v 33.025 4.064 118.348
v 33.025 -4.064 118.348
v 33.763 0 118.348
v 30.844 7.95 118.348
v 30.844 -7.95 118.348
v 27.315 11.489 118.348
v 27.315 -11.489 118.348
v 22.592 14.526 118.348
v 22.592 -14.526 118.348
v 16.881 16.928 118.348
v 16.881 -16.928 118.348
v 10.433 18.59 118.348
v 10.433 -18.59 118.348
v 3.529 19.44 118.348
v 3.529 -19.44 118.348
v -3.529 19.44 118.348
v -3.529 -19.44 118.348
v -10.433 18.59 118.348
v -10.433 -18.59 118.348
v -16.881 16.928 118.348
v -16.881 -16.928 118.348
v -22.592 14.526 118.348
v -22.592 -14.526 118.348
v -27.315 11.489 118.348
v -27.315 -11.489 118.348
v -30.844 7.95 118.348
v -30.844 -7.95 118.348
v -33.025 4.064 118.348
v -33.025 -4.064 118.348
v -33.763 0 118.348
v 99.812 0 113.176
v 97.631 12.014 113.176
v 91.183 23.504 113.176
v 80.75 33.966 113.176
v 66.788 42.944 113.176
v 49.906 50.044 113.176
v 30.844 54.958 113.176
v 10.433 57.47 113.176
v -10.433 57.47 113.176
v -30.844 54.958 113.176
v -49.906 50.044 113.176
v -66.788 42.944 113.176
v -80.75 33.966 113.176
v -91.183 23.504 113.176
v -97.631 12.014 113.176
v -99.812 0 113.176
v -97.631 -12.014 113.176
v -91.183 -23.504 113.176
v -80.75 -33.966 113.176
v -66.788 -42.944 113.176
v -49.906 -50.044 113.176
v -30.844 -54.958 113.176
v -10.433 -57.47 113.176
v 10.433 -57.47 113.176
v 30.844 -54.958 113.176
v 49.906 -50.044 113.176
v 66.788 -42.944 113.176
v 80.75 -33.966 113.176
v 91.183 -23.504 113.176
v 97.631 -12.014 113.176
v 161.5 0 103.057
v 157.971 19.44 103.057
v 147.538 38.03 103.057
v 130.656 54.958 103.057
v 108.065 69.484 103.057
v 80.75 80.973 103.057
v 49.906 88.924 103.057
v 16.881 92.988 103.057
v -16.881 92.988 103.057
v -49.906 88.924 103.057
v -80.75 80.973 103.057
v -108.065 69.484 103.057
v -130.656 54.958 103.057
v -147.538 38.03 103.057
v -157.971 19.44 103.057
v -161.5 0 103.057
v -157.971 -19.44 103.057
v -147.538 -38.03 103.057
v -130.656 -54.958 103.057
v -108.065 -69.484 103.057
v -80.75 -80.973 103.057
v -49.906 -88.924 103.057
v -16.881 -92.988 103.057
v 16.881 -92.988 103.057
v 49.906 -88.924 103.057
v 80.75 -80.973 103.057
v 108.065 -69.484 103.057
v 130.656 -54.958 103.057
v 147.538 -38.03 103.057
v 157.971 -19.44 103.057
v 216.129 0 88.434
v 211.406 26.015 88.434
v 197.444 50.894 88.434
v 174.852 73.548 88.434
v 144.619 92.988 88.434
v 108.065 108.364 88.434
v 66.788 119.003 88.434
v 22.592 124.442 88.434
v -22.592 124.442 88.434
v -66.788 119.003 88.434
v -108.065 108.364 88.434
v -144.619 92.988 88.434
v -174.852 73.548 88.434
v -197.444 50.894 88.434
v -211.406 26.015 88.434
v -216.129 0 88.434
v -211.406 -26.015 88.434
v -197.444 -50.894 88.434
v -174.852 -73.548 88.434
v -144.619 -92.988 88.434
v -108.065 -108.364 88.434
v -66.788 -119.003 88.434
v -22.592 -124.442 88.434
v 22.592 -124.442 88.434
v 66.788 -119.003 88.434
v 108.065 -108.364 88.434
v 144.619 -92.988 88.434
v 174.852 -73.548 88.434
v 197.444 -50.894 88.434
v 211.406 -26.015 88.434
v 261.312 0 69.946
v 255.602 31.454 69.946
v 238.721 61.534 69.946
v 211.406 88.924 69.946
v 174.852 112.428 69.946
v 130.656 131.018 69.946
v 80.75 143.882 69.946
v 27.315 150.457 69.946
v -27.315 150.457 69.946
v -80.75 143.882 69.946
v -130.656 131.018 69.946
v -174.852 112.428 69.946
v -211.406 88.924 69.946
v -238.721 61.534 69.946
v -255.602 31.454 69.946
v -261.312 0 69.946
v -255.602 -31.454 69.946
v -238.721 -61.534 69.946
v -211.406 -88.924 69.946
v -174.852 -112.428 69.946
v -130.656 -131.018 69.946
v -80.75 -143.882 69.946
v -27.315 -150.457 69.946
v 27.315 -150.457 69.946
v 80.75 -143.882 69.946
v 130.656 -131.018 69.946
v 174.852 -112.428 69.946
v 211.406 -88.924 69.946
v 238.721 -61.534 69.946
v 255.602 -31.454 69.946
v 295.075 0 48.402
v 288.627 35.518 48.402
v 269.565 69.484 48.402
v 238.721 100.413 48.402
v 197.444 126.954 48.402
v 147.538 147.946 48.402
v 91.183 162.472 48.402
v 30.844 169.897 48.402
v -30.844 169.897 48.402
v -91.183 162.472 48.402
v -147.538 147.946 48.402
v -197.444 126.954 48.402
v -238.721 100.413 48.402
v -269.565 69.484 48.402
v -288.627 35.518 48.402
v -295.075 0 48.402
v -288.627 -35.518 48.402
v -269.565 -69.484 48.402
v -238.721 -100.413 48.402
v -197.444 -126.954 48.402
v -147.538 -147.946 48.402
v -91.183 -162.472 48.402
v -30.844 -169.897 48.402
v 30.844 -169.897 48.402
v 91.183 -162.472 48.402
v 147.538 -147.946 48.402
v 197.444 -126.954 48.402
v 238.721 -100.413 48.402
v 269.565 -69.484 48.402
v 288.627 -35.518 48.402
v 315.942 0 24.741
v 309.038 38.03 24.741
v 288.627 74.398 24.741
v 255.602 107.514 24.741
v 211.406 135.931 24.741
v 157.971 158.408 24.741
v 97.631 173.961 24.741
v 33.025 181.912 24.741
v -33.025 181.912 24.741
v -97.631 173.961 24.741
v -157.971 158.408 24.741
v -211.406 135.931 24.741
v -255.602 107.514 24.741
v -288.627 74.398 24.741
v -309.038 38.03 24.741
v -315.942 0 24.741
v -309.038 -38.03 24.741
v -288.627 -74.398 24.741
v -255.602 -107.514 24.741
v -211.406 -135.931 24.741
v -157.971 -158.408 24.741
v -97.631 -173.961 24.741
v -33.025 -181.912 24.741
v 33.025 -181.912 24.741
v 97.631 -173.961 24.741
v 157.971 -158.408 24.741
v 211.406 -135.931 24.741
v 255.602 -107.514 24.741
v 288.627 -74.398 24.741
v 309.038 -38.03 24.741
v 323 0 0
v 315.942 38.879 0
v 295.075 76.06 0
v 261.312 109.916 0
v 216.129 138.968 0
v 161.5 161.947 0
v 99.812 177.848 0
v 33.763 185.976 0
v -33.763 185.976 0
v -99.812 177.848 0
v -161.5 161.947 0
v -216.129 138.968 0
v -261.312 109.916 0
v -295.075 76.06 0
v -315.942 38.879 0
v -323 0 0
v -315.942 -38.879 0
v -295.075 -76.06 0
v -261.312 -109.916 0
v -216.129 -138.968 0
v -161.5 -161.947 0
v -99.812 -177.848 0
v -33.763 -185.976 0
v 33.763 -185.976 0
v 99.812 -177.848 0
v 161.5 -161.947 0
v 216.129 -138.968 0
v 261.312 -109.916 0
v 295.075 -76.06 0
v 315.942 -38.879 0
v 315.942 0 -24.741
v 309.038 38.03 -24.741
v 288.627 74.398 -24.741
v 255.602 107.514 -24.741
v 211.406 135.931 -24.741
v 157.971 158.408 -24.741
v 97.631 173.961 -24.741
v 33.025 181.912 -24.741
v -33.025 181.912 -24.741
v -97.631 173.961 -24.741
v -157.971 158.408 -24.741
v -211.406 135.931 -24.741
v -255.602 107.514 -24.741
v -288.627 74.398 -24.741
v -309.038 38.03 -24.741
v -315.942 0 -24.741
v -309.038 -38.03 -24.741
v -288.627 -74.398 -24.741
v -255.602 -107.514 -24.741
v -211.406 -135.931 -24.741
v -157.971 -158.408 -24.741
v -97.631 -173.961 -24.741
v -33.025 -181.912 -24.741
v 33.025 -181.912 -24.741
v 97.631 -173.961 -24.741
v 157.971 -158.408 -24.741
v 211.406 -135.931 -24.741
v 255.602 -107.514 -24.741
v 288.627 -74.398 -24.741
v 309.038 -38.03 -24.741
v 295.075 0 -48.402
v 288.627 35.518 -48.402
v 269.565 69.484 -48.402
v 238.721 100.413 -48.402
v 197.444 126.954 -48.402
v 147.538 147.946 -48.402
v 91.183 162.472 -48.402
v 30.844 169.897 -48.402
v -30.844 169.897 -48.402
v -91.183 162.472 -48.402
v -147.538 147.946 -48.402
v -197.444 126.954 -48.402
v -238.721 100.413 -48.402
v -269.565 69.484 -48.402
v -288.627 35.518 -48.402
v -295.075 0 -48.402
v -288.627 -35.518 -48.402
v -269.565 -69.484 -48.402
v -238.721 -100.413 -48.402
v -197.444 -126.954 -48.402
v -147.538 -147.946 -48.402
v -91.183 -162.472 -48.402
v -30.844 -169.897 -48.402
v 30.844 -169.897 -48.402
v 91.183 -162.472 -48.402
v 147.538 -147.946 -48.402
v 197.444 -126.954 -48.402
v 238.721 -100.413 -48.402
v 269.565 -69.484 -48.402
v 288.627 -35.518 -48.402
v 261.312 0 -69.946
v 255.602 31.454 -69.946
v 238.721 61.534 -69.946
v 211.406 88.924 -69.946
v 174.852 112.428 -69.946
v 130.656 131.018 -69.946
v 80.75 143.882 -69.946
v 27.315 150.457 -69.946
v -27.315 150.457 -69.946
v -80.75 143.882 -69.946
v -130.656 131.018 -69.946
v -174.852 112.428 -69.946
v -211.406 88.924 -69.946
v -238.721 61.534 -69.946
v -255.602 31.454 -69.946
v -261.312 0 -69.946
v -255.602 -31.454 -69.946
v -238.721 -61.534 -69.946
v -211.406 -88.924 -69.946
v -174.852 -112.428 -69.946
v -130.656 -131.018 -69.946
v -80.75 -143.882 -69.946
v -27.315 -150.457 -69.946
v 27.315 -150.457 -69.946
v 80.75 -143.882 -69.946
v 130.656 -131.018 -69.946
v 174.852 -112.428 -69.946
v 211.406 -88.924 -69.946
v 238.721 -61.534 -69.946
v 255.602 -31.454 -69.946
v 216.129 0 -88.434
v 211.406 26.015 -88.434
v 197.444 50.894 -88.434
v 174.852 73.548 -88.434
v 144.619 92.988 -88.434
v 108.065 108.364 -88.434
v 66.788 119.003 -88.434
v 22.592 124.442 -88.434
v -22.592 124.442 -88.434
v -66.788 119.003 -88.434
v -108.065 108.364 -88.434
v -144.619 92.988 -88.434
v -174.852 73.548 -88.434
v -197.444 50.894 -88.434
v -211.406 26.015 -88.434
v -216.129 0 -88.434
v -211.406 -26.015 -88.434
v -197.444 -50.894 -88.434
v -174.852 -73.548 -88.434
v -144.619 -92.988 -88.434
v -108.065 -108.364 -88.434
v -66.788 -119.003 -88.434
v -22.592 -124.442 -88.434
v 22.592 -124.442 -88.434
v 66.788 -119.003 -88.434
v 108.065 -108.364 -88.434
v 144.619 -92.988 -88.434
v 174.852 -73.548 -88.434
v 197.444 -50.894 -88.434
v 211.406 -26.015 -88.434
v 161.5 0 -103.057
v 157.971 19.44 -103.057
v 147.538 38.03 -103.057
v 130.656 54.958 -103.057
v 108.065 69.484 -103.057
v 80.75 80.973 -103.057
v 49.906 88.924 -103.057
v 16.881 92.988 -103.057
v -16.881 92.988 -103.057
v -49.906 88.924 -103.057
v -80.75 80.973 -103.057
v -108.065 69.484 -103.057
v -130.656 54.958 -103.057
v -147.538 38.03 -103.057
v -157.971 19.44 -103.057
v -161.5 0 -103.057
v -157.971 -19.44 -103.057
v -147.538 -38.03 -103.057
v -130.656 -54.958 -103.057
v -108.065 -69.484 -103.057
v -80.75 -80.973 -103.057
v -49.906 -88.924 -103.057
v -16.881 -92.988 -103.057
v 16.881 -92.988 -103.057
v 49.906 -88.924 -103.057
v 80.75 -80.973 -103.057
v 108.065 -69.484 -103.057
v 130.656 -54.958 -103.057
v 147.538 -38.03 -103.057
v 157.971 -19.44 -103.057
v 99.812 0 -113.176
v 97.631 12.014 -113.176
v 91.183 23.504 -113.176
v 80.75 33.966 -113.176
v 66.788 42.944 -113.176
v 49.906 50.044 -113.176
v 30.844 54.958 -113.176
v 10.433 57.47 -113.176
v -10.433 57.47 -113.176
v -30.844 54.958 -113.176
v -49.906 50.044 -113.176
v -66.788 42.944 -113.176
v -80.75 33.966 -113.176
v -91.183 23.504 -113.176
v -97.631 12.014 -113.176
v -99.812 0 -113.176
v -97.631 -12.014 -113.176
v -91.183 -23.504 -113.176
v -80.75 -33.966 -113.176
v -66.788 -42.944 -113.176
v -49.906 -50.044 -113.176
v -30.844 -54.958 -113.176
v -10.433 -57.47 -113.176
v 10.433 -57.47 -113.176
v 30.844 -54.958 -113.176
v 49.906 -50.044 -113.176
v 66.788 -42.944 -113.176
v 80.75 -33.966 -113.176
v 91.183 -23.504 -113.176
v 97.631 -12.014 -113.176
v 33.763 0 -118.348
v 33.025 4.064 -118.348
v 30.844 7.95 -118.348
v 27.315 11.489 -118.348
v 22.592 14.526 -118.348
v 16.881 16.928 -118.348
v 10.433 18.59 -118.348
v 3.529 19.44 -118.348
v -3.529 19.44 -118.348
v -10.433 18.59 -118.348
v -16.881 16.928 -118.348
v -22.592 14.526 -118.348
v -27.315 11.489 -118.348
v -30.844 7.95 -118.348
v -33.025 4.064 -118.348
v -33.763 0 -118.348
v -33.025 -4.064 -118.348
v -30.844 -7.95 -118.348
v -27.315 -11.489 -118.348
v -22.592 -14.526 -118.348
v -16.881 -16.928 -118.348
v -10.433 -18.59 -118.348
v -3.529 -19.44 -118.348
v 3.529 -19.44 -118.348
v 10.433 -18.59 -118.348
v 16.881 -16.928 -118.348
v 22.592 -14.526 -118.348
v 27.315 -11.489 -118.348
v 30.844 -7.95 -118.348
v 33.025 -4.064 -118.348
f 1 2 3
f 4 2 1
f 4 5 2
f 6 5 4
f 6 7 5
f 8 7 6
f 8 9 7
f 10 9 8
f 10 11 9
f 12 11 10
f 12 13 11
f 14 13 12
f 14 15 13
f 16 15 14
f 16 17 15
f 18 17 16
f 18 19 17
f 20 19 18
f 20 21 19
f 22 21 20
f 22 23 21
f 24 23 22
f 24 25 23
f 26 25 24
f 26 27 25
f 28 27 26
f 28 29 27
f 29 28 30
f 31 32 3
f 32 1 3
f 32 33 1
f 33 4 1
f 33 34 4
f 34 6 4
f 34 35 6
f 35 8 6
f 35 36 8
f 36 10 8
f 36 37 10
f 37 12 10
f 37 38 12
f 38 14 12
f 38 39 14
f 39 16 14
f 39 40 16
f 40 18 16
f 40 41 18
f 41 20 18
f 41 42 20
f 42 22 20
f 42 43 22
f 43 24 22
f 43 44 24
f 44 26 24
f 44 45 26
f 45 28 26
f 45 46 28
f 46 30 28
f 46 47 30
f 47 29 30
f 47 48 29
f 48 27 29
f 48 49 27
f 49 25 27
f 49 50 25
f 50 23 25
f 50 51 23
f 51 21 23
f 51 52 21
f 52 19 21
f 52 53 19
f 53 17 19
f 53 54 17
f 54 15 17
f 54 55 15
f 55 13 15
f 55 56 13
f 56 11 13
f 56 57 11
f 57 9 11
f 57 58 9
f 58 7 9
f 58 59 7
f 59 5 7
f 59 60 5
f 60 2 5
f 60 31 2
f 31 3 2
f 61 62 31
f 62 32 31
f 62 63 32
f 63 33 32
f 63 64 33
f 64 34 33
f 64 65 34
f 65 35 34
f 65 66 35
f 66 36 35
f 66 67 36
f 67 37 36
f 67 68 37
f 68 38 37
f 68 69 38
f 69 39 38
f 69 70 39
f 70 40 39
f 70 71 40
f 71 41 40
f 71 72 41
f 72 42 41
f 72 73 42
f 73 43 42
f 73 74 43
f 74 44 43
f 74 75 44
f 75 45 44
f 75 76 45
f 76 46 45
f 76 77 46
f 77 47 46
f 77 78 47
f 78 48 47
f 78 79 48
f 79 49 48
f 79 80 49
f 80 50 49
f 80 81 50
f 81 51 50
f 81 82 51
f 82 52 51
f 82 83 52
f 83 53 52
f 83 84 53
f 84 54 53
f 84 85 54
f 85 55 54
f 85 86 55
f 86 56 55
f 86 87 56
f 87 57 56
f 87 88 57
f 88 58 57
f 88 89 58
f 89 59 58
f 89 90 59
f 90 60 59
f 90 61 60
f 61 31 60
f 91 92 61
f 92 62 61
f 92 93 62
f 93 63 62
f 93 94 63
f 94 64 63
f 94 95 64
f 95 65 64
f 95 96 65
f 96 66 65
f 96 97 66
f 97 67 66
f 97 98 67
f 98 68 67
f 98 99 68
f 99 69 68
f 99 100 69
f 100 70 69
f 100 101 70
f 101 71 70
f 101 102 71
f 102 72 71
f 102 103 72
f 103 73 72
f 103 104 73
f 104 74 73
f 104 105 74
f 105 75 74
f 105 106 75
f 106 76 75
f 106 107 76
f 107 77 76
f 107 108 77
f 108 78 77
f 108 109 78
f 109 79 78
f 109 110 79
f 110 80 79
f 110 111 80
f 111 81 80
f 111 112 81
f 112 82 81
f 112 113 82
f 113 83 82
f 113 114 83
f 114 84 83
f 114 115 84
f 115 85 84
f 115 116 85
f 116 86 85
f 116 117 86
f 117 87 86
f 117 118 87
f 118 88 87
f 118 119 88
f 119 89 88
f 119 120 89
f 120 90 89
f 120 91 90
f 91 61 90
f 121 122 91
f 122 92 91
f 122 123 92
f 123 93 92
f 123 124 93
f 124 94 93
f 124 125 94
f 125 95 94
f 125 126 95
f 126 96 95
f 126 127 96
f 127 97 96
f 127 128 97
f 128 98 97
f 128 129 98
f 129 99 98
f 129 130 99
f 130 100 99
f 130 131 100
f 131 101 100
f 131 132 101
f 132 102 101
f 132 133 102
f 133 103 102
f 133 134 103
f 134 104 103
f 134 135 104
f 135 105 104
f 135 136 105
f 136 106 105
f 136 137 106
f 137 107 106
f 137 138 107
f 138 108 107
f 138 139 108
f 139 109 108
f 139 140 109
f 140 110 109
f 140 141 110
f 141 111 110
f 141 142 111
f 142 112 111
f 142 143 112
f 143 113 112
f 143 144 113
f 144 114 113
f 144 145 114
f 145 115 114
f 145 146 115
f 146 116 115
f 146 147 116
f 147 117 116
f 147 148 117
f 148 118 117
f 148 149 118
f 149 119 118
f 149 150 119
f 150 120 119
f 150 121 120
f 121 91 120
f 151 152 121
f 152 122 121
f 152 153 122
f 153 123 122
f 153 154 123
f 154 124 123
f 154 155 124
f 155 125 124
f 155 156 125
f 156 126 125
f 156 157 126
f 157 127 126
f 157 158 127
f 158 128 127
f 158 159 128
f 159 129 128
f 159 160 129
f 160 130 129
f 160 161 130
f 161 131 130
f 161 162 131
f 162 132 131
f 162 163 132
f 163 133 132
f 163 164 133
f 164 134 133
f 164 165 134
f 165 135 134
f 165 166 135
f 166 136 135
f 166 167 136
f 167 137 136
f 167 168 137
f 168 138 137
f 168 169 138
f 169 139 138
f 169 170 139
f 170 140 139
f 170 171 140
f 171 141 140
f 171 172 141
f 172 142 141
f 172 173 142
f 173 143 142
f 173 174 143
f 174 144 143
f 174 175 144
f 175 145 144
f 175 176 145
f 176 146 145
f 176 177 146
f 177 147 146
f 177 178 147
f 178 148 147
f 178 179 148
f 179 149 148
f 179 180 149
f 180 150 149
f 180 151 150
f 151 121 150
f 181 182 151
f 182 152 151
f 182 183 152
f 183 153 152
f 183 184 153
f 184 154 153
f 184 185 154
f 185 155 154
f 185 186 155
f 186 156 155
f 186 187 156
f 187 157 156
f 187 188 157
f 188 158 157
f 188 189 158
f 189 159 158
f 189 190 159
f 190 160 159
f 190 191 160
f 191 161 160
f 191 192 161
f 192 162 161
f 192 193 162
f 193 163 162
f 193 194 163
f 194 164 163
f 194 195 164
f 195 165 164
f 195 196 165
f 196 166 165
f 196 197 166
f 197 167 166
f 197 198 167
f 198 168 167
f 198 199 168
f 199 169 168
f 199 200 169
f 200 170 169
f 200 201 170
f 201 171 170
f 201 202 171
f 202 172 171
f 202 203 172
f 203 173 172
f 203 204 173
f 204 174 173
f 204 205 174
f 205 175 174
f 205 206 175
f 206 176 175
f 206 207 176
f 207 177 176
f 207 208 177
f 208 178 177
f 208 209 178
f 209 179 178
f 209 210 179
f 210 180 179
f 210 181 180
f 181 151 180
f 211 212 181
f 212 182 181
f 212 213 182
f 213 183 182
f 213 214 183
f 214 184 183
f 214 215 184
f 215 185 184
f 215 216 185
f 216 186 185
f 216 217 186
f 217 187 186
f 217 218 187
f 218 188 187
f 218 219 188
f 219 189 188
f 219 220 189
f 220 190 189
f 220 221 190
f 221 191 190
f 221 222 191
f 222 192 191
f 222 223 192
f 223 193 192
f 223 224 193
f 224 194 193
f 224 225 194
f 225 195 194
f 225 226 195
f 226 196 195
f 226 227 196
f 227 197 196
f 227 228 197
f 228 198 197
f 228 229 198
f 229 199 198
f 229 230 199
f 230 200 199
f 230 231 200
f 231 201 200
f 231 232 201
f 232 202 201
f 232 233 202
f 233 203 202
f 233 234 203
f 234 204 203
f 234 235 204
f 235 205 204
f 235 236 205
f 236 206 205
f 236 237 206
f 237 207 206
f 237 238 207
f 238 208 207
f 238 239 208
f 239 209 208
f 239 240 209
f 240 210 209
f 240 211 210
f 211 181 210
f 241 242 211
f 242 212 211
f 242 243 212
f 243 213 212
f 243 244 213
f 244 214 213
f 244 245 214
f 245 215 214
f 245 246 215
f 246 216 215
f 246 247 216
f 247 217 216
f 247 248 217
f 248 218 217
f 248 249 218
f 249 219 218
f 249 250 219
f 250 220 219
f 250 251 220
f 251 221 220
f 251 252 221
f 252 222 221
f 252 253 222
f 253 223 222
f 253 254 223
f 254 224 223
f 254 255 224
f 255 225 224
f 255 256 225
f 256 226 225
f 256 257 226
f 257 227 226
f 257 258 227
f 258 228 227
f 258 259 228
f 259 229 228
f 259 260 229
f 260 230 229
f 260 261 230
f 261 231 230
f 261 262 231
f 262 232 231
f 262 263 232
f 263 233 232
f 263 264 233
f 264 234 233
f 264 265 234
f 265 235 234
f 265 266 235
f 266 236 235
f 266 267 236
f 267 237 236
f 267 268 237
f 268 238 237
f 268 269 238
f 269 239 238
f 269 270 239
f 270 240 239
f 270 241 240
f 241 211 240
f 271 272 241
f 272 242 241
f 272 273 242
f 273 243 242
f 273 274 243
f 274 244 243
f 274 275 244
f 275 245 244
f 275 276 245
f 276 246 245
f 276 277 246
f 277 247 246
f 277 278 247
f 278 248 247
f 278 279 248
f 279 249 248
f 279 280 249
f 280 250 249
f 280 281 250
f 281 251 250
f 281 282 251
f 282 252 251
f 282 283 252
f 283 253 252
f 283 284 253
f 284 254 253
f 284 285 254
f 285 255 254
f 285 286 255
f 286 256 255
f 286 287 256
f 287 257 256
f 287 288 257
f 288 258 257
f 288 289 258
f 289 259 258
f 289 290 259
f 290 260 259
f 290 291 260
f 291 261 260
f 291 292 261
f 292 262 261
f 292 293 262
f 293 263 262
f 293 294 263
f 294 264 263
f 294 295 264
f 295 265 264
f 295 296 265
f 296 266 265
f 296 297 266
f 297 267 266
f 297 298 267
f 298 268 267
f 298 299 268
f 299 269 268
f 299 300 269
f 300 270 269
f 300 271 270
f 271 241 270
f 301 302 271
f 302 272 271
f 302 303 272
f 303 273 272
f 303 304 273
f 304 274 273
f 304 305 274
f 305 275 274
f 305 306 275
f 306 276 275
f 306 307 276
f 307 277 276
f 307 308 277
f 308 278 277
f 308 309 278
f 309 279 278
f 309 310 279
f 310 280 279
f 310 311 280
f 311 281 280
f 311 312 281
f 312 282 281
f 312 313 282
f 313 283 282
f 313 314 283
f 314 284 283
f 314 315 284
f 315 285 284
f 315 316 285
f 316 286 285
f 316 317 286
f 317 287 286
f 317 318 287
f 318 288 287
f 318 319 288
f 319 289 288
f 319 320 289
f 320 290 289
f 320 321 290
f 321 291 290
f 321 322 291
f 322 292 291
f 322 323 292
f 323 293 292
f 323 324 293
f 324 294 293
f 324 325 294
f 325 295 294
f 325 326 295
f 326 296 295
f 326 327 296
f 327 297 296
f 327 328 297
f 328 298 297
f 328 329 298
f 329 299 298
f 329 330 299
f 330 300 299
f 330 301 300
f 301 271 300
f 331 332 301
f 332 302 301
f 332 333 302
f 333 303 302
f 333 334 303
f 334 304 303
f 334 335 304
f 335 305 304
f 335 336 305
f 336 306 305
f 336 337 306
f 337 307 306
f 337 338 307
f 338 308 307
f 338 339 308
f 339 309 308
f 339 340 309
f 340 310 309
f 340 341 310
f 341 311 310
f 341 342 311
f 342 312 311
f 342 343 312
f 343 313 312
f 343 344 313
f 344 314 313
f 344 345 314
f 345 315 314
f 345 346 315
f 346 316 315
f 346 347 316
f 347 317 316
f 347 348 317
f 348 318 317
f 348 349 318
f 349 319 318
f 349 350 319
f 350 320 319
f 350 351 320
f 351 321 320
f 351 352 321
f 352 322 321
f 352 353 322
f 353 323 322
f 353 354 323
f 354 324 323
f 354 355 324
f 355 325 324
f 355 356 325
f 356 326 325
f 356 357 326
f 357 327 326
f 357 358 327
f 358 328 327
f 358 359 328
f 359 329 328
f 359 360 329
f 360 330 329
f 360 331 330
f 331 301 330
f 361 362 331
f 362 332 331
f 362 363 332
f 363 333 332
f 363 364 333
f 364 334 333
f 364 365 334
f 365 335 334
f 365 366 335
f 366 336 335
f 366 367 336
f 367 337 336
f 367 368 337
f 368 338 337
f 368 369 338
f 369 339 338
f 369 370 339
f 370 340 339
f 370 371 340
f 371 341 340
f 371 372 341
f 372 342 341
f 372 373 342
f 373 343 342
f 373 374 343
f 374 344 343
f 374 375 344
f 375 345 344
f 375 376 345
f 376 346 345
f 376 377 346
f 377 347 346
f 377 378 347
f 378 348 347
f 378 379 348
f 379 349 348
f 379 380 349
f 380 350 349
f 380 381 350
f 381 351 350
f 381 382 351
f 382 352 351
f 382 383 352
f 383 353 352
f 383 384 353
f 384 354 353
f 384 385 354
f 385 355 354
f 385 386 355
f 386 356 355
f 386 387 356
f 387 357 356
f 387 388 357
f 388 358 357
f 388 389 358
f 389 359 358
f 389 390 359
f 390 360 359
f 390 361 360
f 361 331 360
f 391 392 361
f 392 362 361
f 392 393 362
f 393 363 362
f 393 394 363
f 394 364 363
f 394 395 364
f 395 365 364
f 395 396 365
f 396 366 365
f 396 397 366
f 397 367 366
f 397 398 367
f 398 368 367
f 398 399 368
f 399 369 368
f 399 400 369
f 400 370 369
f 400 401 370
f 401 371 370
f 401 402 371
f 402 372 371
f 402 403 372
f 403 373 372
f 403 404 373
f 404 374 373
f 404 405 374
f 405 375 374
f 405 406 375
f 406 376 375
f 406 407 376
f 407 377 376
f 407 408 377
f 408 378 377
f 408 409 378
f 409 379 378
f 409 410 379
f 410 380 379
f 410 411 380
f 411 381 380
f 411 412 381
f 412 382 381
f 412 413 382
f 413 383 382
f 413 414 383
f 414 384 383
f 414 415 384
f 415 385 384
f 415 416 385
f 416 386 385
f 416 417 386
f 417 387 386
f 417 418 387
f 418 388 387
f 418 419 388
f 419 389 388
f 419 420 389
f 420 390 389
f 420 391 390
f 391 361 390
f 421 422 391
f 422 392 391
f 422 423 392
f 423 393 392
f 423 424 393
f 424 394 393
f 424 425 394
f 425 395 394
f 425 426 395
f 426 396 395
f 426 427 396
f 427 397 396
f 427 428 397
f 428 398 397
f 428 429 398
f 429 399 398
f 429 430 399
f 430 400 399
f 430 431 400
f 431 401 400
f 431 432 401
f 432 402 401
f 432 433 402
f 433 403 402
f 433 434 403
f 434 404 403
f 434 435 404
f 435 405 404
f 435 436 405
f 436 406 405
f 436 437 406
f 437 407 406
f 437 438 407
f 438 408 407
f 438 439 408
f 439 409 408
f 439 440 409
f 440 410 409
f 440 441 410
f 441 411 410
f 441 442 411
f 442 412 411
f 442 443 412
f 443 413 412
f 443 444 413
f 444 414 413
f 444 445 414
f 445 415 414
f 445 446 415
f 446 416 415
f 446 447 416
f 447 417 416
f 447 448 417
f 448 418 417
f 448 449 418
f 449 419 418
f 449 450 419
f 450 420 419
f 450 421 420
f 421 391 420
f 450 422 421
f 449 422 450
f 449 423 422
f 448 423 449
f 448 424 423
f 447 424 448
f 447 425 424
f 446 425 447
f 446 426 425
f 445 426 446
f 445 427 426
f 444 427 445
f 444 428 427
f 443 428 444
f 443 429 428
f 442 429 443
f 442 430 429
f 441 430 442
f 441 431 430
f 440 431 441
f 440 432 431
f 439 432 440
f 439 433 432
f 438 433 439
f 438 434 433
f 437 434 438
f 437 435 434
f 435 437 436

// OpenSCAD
// Generated by SolidPython 1.0.1 on 2020-07-29 00:46:54


scale(v = [19, 11, 7]) {
	sphere(r = 17);
}
/***********************************************
*********      SolidPython code:      **********
************************************************
 
# import packages: SolidPython
from solid import *
from solid.utils import *
from itertools import chain, combinations, permutations


class Resize:

    def __init__(self, scad_file):
        self.scad_file = scad_file
        #self.scad_file = import_scad(scad_file)
        # cone/cylinder param:
        self.r1 = 0
        self.r2 = 0
        self.h = 0
        # rectangular prism param:
        self.w = 0
        self.l = 0
        # ellipse param:
        self.r = 0

    # import OpenScad code (file name corresponds to shape)


    # classify shape + parameters
    def assign(self, param1, param2, param3):
        if self.scad_file == 'cone.scad':
            self.r1 = param1
            self.r2 = param2
            self.h = param3
        elif self.scad_file == 'cylinder.scad':
            self.r1 = param1
            self.r2 = param2
            self.h = param3
        elif self.scad_file == 'rectangularPrism.scad':
            self.h = param1
            self.l = param2
            self.w = param3
        else:
            self.r = param1
            self.h = param2

    # resize parameters
    def iterate(self):
        x = range(3, 20, 2)
        i = 1
        if self.scad_file == 'cone.scad':
            tempList = list(permutations(x, 2))
            for temp in tempList:
                param1 = temp[0]
                param2 = temp[1]
                filepath = 'produced_scad_files/' + 'cone' + str(param1) + '_' + str(param2) + '_' + '.scad'
                scad_render_to_file(cylinder(h=param1, r1=param2, r2=0), filepath)

        elif self.scad_file == 'cylinder.scad':
            tempList = list(permutations(x, 3))
            for temp in tempList:
                param1 = temp[0]
                param2 = temp[1]
                filepath = 'produced_scad_files/' + 'cylinder' + str(param1) + '_' + str(param2) + '_' + '.scad'
                scad_render_to_file(cylinder(h=param1, r1=param2, r2=param2), filepath)

        elif self.scad_file == 'rectangularPrism.scad':
            tempList = list(permutations(x, 3))
            for temp in tempList:
                param1 = temp[0]
                param2 = temp[1]
                param3 = temp[2]
                filepath = 'produced_scad_files/' + 'rectangularPrism' + str(param1) + '_' + str(param2) + '_' + str(
                    param3) + '.scad'
                scad_render_to_file(cube(size=(param1, param2, param3)), filepath)

        elif self.scad_file == 'ellipse.scad':
            tempList = list(permutations(x, 4))
            for temp in tempList:
                param1 = temp[0]
                param2 = temp[1]
                param3 = temp[2]
                param4 = temp[3]
                filepath = 'produced_scad_files/' + 'ellipse' + str(param1) + '_' + str(param2) + '_' + str(param3) + '_' + str(param4) + '.scad'
                scad_render_to_file(scale([param1, param2, param3])(sphere(r=param4)), filepath)

    def render_to_scadfile(self):
        scad_render_to_file(scad, 'example.scad') 
 
************************************************/
